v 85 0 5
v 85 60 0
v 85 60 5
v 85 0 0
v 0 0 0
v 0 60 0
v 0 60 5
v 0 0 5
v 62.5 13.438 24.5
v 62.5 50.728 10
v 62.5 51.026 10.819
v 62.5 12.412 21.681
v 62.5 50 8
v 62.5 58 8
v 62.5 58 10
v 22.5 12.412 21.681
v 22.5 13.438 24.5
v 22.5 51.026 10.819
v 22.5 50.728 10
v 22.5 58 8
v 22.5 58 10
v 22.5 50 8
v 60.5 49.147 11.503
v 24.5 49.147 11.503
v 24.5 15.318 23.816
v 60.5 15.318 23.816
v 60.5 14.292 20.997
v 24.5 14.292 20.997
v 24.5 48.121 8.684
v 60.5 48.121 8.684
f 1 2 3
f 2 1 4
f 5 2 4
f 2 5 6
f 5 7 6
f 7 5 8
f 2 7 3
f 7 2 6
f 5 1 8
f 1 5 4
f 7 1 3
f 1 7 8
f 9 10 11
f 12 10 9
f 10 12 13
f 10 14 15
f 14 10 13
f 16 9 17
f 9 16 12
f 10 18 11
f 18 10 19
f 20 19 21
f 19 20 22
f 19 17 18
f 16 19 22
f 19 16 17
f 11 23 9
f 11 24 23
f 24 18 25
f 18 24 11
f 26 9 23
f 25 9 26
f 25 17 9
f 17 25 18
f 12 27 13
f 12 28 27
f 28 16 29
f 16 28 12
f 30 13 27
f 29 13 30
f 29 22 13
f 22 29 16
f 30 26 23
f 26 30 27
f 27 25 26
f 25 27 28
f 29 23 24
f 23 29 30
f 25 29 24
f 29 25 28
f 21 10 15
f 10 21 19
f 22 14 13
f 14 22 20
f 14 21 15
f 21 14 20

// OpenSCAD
// QR Code Stand for Business Cards
// Designed for Orderforge
// Print settings: 0.2mm layer height, 15% infill, supports recommended for overhang

// Dimensions
base_width = 85;      // Standard business card width
base_depth = 60;      // Standard business card height
base_height = 8;
stand_angle = 70;      // Viewing angle

// Card slot dimensions
card_slot_width = 87;
card_slot_depth = 3;
card_slot_offset = 5;

// QR display area
qr_display_width = 40;
qr_display_height = 40;
qr_stand_thickness = 3;

// Base module
module base() {
    difference() {
        cube([base_width, base_depth, base_height]);
        // Card slot
        translate([(base_width - card_slot_width)/2, -1, base_height - card_slot_depth])
            cube([card_slot_width, base_depth + 2, card_slot_depth + 1]);
    }
}

// QR code display stand
module qr_stand() {
    rotate([stand_angle, 0, 0])
    difference() {
        cube([qr_display_width, qr_stand_thickness, qr_display_height]);
        // Recessed area for QR code sticker/display
        translate([2, -1, 2])
            cube([qr_display_width - 4, qr_stand_thickness + 2, qr_display_height - 4]);
    }
}

// Full assembly
module qr_card_stand() {
    // Base with card slot
    base();
    
    // QR display on back
    translate([(base_width - qr_display_width)/2, base_depth - 10, base_height])
        qr_stand();
    
    // Support for QR stand
    translate([(base_width - qr_display_width)/2, base_depth - 10, base_height])
        cube([qr_display_width, 8, 2]);
}

// Render
qr_card_stand();

// Alternative: Simpler angled stand
module simple_card_stand() {
    union() {
        // Angled back
        rotate([-stand_angle, 0, 0])
            cube([base_width, qr_stand_thickness, base_depth]);
        
        // Base
        cube([base_width, 15, 8]);
        
        // Lip at bottom
        translate([0, 0, 0])
            cube([base_width, 3, 10]);
    }
}

// Uncomment for simpler version:
// translate([100, 0, 0]) simple_card_stand();
